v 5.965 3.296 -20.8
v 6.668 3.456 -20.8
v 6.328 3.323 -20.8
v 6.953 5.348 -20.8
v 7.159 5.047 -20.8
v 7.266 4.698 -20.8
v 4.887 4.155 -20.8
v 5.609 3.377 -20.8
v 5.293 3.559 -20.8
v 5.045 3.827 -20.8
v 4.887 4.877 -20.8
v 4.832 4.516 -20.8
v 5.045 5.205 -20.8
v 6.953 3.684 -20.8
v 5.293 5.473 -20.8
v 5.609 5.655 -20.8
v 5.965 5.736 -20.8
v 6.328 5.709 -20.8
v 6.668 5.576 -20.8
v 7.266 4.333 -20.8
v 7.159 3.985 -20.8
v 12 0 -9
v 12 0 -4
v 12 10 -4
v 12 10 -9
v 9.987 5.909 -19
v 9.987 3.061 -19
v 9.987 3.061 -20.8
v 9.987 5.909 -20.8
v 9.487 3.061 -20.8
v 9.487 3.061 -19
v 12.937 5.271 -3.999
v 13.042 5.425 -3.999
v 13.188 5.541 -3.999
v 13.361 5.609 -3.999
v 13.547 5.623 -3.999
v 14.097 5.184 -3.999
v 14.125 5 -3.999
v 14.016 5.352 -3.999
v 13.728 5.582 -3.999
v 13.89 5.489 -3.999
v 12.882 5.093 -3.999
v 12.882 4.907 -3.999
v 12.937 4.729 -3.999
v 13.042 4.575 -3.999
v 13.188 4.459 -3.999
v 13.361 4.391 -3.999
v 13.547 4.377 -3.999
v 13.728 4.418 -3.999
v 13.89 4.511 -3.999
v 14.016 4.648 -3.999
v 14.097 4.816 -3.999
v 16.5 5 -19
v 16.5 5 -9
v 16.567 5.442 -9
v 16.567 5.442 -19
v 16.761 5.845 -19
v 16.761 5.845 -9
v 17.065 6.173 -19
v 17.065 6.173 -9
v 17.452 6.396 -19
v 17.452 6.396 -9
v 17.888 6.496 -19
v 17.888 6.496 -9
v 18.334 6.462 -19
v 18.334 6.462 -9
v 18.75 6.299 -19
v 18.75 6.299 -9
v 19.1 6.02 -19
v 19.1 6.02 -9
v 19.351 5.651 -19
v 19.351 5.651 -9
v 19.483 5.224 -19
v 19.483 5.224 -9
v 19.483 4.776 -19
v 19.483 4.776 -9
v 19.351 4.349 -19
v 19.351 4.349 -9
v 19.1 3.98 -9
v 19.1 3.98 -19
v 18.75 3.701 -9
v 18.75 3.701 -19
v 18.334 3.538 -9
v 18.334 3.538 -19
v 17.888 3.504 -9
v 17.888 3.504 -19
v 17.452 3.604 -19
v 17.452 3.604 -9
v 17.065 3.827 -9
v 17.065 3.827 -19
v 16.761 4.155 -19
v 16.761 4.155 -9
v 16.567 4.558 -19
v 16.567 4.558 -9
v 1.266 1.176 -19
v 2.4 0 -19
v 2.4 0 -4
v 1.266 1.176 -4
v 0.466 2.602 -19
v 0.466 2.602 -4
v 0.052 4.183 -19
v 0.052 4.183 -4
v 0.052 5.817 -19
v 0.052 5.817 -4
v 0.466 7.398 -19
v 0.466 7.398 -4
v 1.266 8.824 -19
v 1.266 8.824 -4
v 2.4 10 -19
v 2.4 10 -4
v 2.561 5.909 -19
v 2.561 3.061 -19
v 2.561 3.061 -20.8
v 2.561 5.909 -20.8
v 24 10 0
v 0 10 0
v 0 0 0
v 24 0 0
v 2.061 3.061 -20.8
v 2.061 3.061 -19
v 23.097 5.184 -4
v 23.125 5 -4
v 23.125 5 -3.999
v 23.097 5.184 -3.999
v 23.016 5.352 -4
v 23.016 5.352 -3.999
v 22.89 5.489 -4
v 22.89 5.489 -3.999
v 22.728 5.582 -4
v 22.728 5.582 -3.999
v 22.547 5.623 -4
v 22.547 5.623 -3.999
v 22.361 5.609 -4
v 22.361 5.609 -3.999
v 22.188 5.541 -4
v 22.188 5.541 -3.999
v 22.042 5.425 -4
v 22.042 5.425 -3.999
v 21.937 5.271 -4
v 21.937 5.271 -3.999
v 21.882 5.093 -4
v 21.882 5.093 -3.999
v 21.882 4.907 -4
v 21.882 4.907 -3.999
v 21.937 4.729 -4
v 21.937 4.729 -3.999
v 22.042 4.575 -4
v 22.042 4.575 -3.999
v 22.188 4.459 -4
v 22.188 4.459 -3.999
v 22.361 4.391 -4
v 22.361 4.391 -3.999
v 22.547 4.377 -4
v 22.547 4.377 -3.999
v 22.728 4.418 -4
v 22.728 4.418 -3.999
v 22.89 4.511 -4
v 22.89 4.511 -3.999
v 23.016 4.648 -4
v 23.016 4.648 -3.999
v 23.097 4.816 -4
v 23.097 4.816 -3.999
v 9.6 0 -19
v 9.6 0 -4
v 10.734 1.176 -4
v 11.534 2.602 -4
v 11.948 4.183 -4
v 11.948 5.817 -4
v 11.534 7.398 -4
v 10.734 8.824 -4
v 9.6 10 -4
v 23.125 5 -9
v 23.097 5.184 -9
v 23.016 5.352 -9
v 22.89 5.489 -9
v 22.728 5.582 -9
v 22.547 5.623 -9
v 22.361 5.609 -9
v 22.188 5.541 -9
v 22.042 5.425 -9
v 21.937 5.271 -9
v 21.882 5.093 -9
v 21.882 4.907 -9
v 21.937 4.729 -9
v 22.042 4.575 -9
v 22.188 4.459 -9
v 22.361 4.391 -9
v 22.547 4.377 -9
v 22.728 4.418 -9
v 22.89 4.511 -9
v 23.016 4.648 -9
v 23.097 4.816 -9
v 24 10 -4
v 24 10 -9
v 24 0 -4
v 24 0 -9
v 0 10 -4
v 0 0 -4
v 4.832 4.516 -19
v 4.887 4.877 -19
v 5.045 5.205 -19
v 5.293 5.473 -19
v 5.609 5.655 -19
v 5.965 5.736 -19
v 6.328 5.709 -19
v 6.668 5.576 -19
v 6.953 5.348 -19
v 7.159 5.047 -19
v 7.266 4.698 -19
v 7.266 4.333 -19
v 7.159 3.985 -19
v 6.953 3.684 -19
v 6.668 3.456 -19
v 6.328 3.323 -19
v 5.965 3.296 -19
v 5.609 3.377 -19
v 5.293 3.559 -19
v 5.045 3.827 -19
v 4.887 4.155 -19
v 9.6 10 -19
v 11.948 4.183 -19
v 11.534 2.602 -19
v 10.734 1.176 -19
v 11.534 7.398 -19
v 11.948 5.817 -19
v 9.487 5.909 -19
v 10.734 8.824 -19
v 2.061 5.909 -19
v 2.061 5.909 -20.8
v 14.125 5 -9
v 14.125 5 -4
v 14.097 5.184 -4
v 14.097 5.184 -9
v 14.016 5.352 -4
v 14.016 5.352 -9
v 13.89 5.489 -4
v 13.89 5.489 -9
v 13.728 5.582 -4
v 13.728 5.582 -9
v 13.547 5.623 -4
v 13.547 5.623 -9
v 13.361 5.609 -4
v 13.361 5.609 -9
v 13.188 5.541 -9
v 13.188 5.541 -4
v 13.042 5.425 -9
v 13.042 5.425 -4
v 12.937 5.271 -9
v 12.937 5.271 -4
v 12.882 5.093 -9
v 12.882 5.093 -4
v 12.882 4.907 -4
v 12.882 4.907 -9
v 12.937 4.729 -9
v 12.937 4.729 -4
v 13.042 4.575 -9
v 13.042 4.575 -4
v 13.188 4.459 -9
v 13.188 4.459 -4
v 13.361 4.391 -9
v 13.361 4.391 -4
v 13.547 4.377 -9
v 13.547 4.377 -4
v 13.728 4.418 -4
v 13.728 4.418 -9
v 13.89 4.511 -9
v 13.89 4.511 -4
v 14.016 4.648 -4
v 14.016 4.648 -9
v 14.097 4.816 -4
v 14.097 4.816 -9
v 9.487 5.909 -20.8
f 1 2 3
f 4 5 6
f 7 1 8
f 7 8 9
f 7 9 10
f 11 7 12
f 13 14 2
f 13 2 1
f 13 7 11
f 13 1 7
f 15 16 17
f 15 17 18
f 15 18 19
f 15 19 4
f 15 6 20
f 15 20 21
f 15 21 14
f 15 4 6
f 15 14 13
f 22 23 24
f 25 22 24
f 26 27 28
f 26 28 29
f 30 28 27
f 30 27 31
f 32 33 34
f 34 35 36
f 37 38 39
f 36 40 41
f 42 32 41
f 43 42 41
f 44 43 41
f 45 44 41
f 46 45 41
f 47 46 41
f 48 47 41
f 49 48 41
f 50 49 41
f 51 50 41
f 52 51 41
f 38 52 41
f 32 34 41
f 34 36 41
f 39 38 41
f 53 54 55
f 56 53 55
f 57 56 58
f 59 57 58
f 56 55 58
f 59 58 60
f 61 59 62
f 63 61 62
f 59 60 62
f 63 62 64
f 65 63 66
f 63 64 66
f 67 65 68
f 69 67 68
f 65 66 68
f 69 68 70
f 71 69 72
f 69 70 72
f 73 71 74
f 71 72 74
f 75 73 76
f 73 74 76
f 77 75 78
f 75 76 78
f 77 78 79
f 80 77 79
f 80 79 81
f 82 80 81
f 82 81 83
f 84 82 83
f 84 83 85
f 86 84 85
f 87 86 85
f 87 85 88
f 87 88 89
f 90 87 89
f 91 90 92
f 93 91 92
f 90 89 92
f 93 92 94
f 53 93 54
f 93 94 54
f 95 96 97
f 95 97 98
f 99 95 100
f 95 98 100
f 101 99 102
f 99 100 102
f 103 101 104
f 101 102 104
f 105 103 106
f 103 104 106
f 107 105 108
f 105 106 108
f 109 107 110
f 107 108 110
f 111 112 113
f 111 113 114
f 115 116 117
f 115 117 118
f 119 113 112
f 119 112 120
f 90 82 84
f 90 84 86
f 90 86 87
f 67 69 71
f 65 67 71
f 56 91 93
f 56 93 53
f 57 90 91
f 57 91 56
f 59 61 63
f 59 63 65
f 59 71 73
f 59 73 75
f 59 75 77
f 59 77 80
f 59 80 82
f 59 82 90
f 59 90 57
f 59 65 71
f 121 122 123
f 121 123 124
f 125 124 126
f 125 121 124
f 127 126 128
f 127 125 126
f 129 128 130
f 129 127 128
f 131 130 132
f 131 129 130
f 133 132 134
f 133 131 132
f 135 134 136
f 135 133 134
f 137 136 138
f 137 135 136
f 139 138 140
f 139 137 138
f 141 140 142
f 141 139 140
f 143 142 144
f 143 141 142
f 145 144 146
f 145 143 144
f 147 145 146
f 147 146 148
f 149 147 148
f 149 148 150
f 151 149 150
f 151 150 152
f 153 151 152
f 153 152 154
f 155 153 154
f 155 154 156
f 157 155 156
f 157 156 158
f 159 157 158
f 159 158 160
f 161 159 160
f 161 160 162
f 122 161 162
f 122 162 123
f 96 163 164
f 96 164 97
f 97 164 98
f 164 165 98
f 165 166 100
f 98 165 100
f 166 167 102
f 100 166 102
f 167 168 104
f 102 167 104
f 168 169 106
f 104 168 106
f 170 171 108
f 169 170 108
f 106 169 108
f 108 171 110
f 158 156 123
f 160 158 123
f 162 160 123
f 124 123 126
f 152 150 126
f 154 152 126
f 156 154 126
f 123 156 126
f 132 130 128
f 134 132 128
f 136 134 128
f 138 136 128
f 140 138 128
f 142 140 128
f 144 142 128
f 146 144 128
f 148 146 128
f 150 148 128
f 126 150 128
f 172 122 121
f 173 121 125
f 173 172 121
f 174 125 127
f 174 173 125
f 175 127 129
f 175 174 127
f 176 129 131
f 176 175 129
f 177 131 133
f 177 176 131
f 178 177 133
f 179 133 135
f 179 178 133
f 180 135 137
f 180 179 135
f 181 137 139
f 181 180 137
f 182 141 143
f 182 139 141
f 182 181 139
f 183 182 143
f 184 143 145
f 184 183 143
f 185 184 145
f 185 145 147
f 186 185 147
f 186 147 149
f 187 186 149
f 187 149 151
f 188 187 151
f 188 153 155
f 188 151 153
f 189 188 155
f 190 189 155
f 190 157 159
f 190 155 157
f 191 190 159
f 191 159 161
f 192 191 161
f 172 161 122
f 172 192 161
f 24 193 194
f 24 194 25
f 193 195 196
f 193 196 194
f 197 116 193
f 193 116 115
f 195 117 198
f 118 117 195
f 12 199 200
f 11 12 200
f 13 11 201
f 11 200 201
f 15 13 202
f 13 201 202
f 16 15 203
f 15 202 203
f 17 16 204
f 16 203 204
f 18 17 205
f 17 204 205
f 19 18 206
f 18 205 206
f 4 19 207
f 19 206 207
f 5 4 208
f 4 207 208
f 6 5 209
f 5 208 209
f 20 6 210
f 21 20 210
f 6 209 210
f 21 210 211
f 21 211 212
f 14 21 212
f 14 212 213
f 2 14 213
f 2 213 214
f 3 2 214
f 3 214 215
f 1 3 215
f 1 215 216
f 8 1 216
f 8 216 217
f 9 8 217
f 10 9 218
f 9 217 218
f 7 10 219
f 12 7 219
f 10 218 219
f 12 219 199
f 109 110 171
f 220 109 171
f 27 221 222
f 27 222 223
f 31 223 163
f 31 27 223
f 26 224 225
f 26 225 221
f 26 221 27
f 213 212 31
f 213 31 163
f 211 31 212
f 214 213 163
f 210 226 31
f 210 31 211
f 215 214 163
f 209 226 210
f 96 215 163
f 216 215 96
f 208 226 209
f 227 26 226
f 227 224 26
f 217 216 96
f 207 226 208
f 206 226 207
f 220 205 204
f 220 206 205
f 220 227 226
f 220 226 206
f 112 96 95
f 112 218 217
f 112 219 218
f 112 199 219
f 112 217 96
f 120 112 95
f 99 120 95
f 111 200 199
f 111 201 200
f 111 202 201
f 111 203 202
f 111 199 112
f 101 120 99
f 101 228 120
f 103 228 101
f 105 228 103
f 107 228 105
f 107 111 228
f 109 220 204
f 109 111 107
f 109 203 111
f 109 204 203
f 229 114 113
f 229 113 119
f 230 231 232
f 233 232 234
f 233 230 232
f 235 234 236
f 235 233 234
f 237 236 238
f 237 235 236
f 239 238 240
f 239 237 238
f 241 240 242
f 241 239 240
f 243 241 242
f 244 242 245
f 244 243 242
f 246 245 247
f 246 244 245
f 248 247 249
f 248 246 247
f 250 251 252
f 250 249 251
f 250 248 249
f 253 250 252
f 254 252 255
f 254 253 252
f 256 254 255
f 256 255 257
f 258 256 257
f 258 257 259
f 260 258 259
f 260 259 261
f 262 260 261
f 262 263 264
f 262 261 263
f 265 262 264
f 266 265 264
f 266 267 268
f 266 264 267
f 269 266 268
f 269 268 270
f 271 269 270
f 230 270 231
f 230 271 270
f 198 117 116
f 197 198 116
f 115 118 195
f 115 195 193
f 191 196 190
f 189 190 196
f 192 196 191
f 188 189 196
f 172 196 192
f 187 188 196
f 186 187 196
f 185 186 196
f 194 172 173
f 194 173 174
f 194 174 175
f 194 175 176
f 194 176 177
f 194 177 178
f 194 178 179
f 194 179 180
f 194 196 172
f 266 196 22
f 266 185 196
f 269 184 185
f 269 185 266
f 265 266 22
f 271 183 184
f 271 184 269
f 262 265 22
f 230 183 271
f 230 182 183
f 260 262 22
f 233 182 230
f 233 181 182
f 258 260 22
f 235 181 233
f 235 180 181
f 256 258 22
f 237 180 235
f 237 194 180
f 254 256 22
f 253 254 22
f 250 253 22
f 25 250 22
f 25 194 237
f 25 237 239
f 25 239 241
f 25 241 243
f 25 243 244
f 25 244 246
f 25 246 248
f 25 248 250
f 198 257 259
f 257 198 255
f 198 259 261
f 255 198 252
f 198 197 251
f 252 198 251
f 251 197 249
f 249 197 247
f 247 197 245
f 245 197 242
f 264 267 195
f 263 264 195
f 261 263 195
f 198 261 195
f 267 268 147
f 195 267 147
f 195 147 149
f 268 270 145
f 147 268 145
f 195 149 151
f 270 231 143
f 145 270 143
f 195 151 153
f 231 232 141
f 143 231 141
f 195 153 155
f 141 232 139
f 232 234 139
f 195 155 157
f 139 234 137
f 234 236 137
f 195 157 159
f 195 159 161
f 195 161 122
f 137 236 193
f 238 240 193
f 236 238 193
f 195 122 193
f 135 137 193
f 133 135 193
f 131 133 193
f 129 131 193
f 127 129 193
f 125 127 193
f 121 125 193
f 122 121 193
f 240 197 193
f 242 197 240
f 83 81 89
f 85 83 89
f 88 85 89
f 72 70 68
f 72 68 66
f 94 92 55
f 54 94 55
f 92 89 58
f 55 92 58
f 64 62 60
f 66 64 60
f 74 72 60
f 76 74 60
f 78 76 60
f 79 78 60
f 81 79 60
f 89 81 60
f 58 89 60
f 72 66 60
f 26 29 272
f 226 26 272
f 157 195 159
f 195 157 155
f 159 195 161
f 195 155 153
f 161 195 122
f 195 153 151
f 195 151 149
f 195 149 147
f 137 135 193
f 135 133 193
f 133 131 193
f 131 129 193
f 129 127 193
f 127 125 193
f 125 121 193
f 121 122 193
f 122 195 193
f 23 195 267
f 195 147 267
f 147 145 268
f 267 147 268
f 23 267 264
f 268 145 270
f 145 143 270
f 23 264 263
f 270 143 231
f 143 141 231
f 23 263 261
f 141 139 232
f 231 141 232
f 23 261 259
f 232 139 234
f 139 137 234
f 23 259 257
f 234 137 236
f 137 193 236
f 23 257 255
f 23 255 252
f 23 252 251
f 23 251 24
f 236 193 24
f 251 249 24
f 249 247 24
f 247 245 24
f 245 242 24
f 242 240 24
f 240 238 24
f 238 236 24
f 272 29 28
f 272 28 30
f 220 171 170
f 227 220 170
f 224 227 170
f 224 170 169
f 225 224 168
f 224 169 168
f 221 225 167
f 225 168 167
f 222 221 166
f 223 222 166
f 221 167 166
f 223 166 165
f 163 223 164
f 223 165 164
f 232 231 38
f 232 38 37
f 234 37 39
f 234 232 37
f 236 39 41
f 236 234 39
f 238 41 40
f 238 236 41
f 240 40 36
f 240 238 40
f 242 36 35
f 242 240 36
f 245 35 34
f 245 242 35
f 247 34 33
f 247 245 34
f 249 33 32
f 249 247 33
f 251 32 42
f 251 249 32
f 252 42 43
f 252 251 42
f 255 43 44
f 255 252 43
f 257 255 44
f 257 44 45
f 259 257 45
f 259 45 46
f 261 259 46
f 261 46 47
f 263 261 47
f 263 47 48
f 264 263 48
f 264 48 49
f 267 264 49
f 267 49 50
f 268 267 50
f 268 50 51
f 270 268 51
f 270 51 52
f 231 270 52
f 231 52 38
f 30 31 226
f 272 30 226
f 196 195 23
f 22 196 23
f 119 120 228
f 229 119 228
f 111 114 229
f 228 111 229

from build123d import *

# Parameters (mm, degrees)
SKETCH_1_W                   = 24
SKETCH_1_H                   = 10
EXTRUDE_1_DEPTH              = 4
EXTRUDE_2_DEPTH              = 15
SKETCH_3_W                   = 0.5
SKETCH_3_H                   = 2.848061163
EXTRUDE_1_2_DEPTH            = 1.8
SKETCH_4_R                   = 1.223700811
EXTRUDE_3_DEPTH              = 1.8
SKETCH_5_W                   = 12
SKETCH_5_H                   = 10
EXTRUDE_4_DEPTH              = 5
SKETCH_6_R                   = 1.5
EXTRUDE_5_DEPTH              = 10
HOLE_START                   = -9
HOLE_WIZARD_M1_6_1_OUTLINE_R = 0.625
HOLE_WIZARD_M1_6_1_DEPTH     = 5.001


# Read off the part's stored shape, not the designer's step: M1.6 螺纹孔1
with BuildPart() as part:
    # 草图1 → Extrude 1 (new body)
    with BuildSketch(Plane.XY):
        with Locations((12, 5)):
            Rectangle(SKETCH_1_W, SKETCH_1_H)
    extrude(amount=-EXTRUDE_1_DEPTH)


with BuildPart() as body_2:
    # 草图2 → 凸台-拉伸2 (new body)
    with BuildSketch(Plane(origin=(0, 0, -4), x_dir=(-1, 0, 0), z_dir=(0, 0, -1))):
        with BuildLine():
            Line((-9.6, 0), (-2.4, 0))
            ThreePointArc((-2.4, 0), (0, 5), (-2.4, 10))
            Line((-2.4, 10), (-9.6, 10))
            ThreePointArc((-9.6, 10), (-12, 5), (-9.6, 0))
        make_face()
    extrude(amount=EXTRUDE_2_DEPTH)

    # 草图3 → Extrude 1 2 (add)
    with BuildSketch(Plane(origin=(0, 0, -19), x_dir=(-1, 0, 0), z_dir=(0, 0, -1))):
        with Locations((-9.736566452, 4.48522879)):
            Rectangle(SKETCH_3_W, SKETCH_3_H)
        with Locations((-2.310898304, 4.48522879)):
            Rectangle(SKETCH_3_W, SKETCH_3_H)
    extrude(amount=EXTRUDE_1_2_DEPTH)

    # 草图4 → 凸台-拉伸3 (add)
    with BuildSketch(Plane(origin=(0, 0, -19), x_dir=(-1, 0, 0), z_dir=(0, 0, -1))):
        with Locations((-6.056056762, 4.515848892)):
            Circle(SKETCH_4_R)
    extrude(amount=EXTRUDE_3_DEPTH)


with BuildPart() as body_3:
    # 草图5 → 凸台-拉伸4 (new body)
    with BuildSketch(Plane(origin=(0, 0, -4), x_dir=(-1, 0, 0), z_dir=(0, 0, -1))):
        with Locations((-18, 5)):
            Rectangle(SKETCH_5_W, SKETCH_5_H)
    extrude(amount=EXTRUDE_4_DEPTH)


with BuildPart() as body_4:
    # 草图6 → 凸台-拉伸5 (new body)
    with BuildSketch(Plane(origin=(0, 0, -9), x_dir=(-1, 0, 0), z_dir=(0, 0, -1))):
        with Locations((-18, 5)):
            Circle(SKETCH_6_R)
    extrude(amount=EXTRUDE_5_DEPTH)


with BuildPart() as hole_wizard_m1_6_1_tool:
    # M1.6 螺纹孔1 outline → M1.6 螺纹孔1 (new body)
    with BuildSketch(Plane.XY.offset(HOLE_START)):
        with Locations((13.5, 5)):
            Circle(HOLE_WIZARD_M1_6_1_OUTLINE_R)
        with Locations((22.5, 5)):
            Circle(HOLE_WIZARD_M1_6_1_OUTLINE_R)
    extrude(amount=HOLE_WIZARD_M1_6_1_DEPTH)


with BuildPart() as part_1:
    add(part.part)

    # M1.6 螺纹孔1: cut by hole_wizard_m1_6_1_tool
    add(hole_wizard_m1_6_1_tool.part, mode=Mode.SUBTRACT)


with BuildPart() as body_3_1:
    add(body_3.part)

    # M1.6 螺纹孔1: cut by hole_wizard_m1_6_1_tool
    add(hole_wizard_m1_6_1_tool.part, mode=Mode.SUBTRACT)


solid = Compound([body_2.part, body_4.part, part_1.part, body_3_1.part])
